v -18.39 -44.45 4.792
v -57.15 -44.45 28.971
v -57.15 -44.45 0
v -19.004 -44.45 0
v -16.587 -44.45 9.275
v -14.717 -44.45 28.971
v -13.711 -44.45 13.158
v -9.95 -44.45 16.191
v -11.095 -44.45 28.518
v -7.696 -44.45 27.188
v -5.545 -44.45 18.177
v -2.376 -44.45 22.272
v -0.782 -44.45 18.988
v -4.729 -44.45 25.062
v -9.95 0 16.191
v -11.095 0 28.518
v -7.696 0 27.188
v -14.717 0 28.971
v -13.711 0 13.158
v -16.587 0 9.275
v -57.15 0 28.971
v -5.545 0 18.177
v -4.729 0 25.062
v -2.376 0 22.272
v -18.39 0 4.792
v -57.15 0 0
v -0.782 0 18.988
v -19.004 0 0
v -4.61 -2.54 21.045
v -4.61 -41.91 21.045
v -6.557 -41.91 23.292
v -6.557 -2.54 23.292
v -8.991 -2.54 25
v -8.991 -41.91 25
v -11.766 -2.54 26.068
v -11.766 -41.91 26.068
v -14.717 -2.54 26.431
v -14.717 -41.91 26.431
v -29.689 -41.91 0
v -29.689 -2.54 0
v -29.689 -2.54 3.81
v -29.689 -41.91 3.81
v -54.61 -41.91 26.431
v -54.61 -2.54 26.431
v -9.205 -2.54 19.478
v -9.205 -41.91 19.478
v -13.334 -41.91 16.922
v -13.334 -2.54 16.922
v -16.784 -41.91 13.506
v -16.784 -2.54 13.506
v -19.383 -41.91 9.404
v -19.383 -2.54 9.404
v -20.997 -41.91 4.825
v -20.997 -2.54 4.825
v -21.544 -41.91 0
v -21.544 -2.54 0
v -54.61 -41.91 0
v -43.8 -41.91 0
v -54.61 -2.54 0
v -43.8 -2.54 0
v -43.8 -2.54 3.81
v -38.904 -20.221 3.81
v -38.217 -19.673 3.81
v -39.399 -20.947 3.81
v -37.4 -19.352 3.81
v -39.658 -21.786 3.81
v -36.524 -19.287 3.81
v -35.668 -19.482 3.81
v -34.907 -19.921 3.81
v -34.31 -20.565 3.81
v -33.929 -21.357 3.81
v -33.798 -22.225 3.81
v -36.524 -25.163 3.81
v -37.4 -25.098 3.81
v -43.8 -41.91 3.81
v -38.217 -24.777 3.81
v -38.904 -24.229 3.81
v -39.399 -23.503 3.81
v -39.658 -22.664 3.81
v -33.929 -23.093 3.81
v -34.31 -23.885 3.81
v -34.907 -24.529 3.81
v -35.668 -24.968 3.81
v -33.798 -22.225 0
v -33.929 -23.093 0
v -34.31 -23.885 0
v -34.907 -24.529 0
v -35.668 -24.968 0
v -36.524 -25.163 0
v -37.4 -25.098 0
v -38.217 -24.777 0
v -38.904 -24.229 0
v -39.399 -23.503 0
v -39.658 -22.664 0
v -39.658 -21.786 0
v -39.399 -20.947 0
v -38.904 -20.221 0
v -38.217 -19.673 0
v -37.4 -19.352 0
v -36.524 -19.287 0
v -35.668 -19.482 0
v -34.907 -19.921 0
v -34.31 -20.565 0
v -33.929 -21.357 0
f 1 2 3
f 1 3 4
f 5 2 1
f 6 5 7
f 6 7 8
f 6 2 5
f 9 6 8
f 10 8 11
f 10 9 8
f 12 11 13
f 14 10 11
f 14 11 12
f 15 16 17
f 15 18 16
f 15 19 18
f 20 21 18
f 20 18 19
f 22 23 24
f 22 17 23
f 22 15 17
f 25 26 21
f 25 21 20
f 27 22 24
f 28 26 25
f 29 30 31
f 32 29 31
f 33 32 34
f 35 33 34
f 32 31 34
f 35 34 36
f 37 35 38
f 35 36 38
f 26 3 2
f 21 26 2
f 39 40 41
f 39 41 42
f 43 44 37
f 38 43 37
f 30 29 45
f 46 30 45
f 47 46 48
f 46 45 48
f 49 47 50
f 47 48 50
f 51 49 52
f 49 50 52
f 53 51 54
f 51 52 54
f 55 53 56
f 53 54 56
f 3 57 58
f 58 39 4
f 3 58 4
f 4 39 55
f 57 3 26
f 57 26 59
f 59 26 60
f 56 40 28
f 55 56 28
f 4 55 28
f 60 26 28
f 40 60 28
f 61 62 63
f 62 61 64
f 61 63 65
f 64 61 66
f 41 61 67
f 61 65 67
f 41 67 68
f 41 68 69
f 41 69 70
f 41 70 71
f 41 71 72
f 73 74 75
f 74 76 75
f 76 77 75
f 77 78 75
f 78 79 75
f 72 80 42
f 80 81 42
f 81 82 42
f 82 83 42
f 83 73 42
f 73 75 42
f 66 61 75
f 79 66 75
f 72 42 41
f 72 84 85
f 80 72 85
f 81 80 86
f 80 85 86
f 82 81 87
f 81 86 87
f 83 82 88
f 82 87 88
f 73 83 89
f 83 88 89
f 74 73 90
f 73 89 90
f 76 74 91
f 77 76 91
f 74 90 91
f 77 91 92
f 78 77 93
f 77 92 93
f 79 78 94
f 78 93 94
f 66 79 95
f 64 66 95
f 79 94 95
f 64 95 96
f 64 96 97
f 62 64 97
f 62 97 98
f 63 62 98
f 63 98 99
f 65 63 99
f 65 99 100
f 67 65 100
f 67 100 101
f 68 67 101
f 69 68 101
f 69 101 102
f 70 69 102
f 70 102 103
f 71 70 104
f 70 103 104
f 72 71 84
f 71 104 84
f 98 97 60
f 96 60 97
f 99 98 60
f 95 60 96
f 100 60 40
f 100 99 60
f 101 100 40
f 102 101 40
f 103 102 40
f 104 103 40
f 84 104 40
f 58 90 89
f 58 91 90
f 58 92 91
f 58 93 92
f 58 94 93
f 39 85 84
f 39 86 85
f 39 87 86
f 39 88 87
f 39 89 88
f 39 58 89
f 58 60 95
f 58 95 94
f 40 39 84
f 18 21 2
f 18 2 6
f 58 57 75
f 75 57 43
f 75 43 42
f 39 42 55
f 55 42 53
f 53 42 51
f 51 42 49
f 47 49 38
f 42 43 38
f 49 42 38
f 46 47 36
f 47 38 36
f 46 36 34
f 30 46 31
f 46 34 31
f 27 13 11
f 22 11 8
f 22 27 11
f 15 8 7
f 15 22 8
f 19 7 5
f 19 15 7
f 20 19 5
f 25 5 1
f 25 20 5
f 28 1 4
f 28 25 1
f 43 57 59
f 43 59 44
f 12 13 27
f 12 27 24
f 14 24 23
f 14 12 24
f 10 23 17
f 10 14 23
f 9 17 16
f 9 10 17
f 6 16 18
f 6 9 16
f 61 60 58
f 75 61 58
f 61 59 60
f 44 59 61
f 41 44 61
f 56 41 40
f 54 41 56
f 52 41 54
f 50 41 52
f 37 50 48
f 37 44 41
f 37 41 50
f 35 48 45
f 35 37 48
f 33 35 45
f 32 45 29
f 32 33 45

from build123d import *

# Parameters (mm, degrees)
F0_W     = 57.15
F0_H     = 28.970775
F1_DEPTH = 44.45
F2_R     = 14.717046
F3_R     = 19.003724
F4_DEPTH = 66.548
F5_T     = -2.54
F6_W     = 14.110848
F6_H     = 44.45
F6_R     = 2.9464
F7_DEPTH = 3.81


with BuildPart() as f1:
    # F0 (on Front) → F1 (new body)
    with BuildSketch(Plane.XZ):
        with Locations((-28.575, 14.485387)):
            Rectangle(F0_W, F0_H)
    extrude(amount=F1_DEPTH)

    # F2
    f2_edges = [f1.edges().sort_by_distance(p)[0] for p in [
        (0, -22.225, 28.970775),
    ]]
    fillet(f2_edges, radius=F2_R)

    # F3 (on Front) → F4 (cut)
    with BuildSketch(Plane.XZ):
        Circle(F3_R)
    extrude(amount=F4_DEPTH, mode=Mode.SUBTRACT)

    # F5
    f5_openings = [f1.faces().sort_by_distance(p)[0] for p in [
        (-38.076862, -22.225, 0),
    ]]
    offset(amount=F5_T, openings=f5_openings)

    # F6 (on face) → F7 (join)
    with BuildSketch(Plane(origin=(0, 0, 0), x_dir=(1, 0, 0), z_dir=(0, 0, -1))):
        with Locations((-36.744211, 22.225)):
            Rectangle(F6_W, F6_H)
        with Locations((-36.744211, 22.225)):
            Circle(F6_R, mode=Mode.SUBTRACT)
    extrude(amount=-F7_DEPTH)


solid = f1.part
